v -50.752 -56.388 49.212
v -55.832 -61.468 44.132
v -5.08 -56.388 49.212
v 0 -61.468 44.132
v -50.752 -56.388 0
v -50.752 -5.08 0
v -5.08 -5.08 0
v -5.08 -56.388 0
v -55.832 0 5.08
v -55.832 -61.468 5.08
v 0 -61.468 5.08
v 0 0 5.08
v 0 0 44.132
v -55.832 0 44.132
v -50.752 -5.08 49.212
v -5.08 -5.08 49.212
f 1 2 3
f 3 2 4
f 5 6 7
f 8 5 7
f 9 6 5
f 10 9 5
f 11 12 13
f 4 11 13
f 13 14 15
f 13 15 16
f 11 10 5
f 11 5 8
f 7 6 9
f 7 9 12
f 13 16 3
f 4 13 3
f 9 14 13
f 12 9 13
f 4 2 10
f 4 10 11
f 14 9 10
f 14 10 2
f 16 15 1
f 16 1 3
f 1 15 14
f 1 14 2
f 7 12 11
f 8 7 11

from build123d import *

# Parameters (mm, degrees)
F0_W     = 55.832479
F0_H     = 49.21193
F1_DEPTH = 61.468
F2_SIZE  = 5.08
F3_SIZE  = 5.08


with BuildPart() as f1:
    # F0 (on Front) → F1 (new body)
    with BuildSketch(Plane.XZ):
        with Locations((-27.916239, 24.605965)):
            Rectangle(F0_W, F0_H)
    extrude(amount=F1_DEPTH)

    # F2
    f2_edges = [f1.edges().sort_by_distance(p)[0] for p in [
        (0, -30.734, 49.21193),
        (-27.91624, -61.468, 49.21193),
        (-55.832479, -30.734, 49.21193),
        (-27.91624, 0, 49.21193),
    ]]
    chamfer(f2_edges, length=F2_SIZE)

    # F3
    f3_edges = [f1.edges().sort_by_distance(p)[0] for p in [
        (0, -30.734, 0),
        (-27.91624, -61.468, 0),
        (-55.832479, -30.734, 0),
        (-27.91624, 0, 0),
    ]]
    chamfer(f3_edges, length=F3_SIZE)


solid = f1.part
